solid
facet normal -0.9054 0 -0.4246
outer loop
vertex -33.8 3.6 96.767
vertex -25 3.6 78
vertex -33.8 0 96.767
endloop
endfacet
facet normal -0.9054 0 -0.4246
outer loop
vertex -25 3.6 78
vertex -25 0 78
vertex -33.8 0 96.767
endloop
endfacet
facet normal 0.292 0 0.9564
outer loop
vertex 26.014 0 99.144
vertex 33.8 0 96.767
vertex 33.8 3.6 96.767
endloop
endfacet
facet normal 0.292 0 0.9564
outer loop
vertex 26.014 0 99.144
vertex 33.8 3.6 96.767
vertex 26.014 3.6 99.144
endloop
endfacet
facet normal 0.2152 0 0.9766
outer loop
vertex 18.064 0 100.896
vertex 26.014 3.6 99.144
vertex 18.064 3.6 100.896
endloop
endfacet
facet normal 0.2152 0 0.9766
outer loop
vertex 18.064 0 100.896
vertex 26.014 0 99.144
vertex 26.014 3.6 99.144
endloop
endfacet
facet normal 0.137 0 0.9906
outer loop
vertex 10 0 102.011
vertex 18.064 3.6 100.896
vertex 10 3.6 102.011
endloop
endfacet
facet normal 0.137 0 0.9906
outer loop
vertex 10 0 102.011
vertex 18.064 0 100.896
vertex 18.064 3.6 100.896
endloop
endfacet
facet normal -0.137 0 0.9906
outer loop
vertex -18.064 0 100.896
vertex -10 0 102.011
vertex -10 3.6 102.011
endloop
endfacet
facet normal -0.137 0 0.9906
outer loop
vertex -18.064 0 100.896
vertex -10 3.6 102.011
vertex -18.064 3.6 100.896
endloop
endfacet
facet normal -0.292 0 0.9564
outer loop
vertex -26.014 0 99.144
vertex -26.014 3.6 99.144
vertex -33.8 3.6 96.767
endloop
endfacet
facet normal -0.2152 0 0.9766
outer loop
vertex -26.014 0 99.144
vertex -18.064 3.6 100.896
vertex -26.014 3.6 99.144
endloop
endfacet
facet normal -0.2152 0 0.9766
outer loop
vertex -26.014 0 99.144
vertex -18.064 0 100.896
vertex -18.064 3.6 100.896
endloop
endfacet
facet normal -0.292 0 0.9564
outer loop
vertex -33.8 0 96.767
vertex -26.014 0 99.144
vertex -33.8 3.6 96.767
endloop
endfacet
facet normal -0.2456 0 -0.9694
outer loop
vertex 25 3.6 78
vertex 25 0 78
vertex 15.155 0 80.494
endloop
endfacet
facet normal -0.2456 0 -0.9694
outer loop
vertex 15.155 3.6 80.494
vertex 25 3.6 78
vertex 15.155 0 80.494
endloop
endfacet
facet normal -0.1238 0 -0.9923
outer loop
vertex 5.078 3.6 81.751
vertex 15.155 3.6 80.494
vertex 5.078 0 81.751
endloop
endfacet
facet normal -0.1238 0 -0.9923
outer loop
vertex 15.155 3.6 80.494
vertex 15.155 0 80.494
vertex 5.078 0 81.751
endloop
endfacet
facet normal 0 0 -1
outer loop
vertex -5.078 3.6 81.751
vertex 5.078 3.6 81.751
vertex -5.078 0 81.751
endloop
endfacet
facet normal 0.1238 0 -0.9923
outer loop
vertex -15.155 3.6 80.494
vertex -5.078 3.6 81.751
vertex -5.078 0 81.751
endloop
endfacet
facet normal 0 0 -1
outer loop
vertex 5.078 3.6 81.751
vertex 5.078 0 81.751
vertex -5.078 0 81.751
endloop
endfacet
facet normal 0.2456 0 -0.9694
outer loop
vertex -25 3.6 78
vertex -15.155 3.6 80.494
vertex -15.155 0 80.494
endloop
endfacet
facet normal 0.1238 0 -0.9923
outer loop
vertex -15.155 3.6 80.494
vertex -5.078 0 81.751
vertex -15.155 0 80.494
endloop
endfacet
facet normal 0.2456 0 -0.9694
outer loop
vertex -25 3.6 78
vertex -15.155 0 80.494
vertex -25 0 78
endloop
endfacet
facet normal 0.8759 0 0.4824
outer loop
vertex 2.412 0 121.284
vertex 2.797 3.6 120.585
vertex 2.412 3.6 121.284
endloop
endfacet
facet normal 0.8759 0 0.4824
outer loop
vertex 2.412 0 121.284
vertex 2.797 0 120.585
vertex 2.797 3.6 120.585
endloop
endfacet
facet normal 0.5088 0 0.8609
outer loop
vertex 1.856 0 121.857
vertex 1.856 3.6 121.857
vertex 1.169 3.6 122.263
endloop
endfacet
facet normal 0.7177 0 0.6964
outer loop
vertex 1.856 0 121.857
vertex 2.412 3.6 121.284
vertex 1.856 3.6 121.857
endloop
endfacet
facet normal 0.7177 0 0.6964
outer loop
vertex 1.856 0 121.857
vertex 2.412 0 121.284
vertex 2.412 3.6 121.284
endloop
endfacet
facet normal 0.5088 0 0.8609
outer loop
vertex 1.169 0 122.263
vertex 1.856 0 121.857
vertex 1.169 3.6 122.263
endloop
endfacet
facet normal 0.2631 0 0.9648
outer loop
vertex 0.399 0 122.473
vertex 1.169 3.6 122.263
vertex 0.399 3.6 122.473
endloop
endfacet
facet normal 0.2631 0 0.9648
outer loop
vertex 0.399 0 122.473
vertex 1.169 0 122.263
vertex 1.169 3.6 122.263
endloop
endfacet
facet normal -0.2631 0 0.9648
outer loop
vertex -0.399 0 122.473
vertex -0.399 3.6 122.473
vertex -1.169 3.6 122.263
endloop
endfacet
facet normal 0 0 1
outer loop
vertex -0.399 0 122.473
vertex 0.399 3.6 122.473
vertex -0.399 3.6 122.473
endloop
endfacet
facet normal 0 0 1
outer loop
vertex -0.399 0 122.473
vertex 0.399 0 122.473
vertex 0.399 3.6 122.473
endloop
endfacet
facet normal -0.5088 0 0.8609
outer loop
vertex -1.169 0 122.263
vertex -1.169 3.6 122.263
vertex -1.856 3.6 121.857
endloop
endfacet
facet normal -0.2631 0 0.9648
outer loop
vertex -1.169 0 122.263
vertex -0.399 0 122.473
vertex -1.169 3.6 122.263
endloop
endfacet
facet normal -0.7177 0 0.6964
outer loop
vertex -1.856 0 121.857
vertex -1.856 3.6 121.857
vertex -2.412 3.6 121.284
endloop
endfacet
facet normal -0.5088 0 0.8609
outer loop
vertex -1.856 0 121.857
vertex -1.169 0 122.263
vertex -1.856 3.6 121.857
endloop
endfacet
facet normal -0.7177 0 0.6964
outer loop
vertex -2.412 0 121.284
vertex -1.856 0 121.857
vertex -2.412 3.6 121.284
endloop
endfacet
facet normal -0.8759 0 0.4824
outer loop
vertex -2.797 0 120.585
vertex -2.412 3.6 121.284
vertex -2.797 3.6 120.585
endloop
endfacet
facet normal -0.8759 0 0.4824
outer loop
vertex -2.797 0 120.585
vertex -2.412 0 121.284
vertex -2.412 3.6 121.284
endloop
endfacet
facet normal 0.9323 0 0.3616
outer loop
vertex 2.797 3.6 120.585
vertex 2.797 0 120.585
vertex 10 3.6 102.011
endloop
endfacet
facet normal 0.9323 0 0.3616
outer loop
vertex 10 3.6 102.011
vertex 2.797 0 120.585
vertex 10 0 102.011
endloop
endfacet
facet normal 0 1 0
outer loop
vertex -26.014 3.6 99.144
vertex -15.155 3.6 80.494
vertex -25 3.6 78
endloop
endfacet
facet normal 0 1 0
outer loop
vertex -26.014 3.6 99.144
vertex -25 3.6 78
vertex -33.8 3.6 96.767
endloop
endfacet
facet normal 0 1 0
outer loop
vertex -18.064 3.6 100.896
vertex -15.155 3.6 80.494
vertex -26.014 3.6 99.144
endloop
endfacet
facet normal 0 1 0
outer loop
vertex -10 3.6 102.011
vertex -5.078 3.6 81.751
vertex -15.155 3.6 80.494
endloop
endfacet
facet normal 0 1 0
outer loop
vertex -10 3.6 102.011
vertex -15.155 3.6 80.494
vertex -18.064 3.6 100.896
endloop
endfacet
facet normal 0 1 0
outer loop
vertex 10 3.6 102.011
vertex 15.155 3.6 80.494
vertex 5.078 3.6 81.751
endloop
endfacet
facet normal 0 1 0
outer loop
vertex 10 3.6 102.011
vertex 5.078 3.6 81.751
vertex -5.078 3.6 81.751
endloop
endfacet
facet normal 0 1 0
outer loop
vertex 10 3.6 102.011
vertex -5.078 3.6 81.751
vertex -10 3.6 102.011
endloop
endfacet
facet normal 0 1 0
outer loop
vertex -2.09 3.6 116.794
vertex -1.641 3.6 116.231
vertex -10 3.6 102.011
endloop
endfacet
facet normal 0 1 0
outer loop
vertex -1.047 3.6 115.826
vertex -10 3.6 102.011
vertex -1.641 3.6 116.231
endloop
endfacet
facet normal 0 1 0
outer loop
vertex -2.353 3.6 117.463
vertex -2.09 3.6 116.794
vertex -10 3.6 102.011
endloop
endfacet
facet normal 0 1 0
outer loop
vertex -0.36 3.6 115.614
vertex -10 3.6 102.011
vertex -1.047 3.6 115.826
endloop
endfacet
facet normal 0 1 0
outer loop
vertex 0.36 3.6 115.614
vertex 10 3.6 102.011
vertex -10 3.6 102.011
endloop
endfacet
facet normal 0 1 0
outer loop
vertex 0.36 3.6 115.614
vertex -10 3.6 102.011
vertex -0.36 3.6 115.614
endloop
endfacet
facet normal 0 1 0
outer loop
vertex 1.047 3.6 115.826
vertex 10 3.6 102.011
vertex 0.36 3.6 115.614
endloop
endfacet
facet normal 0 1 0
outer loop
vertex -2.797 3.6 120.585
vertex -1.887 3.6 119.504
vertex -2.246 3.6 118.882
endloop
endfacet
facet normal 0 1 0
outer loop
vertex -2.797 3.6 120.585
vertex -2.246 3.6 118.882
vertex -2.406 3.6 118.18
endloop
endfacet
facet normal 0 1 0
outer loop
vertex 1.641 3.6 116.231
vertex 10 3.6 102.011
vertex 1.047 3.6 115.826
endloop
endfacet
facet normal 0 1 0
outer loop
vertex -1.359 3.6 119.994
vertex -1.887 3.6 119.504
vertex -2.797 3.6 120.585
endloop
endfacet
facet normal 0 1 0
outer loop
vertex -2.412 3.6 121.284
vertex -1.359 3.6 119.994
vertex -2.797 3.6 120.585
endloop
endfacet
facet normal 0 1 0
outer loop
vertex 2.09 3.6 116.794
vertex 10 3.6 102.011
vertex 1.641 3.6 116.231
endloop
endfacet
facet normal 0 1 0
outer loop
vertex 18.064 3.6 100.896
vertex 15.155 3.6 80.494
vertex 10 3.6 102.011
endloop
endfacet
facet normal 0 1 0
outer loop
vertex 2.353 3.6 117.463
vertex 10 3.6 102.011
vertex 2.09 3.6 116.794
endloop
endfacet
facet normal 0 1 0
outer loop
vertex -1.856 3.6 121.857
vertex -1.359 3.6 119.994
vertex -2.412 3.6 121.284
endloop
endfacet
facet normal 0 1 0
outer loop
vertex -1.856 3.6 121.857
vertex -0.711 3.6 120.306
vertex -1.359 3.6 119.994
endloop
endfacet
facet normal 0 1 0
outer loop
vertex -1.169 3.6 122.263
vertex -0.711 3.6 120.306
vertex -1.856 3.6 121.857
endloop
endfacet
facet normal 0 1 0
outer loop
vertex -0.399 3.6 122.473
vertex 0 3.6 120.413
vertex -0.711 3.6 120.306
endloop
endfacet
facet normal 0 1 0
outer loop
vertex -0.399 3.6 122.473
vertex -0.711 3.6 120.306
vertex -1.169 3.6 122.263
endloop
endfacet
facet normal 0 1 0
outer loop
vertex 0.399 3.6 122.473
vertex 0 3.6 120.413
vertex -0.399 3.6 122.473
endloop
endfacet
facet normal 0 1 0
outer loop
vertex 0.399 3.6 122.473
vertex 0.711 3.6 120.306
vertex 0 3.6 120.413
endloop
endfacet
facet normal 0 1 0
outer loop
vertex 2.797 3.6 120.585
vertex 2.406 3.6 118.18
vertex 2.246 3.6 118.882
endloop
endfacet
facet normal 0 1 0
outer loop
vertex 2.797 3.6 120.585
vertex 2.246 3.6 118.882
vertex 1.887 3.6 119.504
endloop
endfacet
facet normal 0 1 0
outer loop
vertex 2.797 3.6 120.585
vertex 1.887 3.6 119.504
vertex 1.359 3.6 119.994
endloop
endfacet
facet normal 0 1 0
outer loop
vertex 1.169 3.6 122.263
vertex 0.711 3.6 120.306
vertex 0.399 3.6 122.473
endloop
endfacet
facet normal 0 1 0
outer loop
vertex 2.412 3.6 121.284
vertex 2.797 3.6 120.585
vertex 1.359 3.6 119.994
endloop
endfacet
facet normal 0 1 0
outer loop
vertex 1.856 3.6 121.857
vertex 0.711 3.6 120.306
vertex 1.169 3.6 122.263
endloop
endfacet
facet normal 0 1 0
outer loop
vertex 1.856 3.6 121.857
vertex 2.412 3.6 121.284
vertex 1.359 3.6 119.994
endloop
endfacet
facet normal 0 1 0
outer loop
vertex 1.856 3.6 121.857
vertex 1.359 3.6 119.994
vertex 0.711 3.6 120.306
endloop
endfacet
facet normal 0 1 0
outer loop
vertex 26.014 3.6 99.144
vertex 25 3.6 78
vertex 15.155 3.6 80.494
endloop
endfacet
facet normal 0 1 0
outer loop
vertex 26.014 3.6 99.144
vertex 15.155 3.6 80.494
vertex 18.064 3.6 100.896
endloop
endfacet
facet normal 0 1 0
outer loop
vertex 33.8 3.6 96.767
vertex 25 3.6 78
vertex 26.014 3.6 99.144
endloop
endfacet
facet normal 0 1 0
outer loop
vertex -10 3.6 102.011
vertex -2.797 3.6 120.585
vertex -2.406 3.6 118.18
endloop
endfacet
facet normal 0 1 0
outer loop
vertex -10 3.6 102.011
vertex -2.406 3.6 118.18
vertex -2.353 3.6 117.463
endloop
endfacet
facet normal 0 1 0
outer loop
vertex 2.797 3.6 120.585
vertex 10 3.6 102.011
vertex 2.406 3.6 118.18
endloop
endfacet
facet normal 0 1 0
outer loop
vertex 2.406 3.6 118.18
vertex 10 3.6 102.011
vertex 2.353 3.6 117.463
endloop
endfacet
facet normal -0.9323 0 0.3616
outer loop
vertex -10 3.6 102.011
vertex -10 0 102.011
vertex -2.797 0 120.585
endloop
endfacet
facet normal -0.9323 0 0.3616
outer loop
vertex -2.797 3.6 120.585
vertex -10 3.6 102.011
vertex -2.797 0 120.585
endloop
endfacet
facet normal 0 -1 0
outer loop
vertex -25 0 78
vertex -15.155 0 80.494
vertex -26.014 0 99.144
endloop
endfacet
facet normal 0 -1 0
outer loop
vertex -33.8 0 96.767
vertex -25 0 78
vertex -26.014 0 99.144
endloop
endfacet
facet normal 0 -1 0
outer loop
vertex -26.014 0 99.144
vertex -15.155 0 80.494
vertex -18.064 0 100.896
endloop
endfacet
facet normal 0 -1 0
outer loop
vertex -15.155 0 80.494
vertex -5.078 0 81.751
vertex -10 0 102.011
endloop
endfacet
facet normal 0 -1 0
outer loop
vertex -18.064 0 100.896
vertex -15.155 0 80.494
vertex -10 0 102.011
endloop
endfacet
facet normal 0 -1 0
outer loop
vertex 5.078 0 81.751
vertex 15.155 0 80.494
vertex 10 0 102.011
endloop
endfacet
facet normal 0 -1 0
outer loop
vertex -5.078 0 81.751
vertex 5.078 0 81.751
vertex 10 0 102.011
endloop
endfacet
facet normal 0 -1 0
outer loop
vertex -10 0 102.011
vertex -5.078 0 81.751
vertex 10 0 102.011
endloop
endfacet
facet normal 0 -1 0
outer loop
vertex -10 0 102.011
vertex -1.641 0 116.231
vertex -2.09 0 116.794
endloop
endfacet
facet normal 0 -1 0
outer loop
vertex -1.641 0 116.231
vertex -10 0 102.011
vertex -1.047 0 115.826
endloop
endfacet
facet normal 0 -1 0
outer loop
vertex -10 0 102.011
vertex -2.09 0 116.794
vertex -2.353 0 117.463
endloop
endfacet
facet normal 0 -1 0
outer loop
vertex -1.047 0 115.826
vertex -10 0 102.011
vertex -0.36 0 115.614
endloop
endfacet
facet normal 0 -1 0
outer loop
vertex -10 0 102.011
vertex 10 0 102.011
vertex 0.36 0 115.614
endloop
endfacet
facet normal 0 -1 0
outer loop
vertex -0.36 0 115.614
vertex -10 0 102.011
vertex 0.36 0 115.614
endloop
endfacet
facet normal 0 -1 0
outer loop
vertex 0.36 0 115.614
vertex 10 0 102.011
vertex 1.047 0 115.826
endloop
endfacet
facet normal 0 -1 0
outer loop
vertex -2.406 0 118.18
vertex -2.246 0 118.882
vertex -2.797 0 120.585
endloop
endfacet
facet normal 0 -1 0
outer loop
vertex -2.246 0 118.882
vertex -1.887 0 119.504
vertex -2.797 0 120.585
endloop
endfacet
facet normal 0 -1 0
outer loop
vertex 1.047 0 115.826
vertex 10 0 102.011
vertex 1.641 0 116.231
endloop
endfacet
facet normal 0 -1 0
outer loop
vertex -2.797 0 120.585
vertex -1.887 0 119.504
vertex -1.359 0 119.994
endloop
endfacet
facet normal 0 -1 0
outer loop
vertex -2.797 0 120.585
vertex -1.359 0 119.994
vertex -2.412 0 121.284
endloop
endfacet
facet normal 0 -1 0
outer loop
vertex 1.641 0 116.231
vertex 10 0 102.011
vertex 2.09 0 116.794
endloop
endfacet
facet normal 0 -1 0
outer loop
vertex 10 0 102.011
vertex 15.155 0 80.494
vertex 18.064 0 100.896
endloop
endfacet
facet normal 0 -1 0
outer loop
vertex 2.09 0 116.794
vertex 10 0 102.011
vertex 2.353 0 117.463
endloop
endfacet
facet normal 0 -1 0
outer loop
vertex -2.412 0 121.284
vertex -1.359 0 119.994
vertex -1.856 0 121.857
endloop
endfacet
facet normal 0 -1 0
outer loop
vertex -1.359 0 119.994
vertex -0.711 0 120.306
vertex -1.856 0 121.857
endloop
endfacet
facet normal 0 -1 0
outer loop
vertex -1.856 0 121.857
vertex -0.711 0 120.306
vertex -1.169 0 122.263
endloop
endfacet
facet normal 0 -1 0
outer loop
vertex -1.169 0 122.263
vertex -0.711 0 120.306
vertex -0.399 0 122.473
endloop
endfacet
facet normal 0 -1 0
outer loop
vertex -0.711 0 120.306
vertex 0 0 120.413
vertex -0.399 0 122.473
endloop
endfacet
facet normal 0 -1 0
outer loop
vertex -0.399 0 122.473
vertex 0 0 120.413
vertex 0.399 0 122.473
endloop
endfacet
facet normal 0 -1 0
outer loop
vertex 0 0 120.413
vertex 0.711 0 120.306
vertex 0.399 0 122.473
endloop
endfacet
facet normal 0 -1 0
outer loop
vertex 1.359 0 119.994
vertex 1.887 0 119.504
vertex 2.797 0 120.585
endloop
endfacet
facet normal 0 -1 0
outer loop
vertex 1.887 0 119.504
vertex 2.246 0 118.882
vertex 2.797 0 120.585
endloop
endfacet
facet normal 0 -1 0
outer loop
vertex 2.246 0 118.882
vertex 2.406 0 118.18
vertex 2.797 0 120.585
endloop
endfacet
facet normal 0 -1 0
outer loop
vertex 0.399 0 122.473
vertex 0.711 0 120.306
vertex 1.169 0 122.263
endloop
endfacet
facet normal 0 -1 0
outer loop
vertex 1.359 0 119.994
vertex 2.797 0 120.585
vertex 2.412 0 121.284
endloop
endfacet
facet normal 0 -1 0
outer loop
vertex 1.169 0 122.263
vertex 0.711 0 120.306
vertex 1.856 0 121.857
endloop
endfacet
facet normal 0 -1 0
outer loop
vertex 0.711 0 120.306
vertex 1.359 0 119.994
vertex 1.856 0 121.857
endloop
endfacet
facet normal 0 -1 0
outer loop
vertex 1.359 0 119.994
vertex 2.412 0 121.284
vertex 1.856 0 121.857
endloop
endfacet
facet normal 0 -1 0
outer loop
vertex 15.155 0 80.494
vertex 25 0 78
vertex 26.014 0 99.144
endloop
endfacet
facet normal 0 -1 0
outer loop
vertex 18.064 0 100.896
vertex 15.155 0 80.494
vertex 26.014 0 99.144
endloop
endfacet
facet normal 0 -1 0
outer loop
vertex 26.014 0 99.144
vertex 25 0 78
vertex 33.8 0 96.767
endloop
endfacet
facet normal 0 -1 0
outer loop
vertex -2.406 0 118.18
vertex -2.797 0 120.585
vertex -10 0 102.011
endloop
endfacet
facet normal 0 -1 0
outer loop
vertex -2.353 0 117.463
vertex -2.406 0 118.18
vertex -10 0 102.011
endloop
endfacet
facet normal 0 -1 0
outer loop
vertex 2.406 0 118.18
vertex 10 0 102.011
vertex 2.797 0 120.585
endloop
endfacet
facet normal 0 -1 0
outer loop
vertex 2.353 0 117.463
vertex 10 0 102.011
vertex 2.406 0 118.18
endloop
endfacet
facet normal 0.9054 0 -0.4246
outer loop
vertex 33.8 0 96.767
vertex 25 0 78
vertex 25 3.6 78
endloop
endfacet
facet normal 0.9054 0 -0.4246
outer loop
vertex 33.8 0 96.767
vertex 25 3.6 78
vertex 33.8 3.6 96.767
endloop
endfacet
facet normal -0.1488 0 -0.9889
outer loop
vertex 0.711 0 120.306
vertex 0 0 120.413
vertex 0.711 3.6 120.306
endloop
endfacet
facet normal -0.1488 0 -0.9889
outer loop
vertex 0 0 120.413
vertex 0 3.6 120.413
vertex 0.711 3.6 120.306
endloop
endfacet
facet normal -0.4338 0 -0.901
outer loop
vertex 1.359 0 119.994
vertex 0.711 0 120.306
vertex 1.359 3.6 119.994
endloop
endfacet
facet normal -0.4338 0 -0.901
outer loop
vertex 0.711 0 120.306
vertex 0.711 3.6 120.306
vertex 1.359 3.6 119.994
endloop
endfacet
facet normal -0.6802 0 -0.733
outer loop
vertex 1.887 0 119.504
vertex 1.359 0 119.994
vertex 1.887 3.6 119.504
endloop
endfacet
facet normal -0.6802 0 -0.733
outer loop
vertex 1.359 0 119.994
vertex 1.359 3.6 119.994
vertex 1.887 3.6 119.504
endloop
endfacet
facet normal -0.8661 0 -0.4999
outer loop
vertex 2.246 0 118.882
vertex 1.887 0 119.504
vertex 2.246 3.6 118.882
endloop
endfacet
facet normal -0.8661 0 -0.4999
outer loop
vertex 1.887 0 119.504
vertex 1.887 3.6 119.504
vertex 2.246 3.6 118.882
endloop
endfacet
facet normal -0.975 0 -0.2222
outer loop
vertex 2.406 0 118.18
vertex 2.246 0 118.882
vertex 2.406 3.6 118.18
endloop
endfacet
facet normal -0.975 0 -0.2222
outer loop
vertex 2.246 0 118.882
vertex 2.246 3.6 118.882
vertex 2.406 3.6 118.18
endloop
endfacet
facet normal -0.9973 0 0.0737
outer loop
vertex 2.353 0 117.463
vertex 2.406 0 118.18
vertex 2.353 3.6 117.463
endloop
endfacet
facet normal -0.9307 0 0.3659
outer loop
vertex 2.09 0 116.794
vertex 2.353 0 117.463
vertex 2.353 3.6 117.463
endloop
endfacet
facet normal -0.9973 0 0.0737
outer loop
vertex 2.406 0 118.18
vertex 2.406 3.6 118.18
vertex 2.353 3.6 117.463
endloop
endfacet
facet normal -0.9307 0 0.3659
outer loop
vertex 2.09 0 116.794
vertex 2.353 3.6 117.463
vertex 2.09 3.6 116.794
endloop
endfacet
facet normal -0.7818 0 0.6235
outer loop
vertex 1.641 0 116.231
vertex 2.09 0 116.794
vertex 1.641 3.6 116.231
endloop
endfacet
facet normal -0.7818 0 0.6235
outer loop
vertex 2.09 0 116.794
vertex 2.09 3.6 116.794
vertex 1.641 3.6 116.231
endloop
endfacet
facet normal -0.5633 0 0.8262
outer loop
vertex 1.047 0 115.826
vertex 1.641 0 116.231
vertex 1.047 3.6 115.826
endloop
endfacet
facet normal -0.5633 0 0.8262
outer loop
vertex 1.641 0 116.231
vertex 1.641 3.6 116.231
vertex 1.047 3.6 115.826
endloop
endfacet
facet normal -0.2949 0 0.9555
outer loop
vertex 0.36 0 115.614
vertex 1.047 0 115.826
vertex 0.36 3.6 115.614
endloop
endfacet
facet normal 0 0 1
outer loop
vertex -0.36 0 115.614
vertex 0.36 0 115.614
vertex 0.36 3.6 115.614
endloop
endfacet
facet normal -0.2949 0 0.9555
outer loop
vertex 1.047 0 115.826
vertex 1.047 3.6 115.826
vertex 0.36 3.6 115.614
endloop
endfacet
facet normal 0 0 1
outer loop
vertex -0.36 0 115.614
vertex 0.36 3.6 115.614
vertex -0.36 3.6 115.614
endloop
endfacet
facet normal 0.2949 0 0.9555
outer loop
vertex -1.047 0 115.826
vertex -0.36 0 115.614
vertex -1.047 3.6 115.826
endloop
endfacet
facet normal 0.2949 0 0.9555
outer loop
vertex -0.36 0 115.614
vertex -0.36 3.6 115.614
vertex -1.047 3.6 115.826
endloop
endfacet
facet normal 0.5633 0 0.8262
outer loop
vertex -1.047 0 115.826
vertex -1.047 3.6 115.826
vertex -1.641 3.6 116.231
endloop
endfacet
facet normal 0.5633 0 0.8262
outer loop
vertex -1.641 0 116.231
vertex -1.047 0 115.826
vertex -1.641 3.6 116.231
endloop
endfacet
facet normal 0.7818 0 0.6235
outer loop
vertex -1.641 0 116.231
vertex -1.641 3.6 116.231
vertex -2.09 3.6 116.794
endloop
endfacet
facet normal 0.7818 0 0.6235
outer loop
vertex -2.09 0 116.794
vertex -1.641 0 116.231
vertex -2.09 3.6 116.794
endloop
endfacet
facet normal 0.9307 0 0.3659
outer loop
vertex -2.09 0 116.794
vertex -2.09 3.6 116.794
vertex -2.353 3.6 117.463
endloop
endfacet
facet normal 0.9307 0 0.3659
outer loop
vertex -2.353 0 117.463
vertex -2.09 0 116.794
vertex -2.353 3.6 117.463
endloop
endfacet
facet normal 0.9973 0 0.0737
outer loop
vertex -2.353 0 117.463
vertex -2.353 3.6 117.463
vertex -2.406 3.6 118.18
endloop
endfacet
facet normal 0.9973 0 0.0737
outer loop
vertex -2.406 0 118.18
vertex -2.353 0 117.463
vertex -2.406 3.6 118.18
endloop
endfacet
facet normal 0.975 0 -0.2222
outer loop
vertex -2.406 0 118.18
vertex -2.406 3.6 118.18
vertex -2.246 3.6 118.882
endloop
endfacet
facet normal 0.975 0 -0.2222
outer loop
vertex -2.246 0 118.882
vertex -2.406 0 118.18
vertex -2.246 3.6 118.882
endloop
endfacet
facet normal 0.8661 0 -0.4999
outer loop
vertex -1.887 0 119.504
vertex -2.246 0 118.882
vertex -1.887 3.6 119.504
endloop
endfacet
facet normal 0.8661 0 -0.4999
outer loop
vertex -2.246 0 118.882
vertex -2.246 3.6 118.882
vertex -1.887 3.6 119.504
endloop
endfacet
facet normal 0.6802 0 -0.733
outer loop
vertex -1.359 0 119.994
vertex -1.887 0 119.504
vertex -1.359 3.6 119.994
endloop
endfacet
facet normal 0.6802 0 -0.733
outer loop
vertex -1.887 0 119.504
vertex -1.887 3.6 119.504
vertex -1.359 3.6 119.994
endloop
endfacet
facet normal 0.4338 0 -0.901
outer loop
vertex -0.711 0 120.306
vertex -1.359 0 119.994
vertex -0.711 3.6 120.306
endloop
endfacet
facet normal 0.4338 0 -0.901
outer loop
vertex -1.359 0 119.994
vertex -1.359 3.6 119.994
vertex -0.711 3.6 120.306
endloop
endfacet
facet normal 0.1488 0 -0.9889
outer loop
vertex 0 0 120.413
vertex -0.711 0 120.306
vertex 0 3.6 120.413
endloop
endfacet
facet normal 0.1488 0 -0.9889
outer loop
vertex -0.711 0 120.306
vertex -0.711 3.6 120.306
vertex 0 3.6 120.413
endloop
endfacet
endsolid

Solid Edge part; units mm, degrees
sketch "Sketch1" plane through (10.8674, 0, 10.8674) normal (0, -1, 0) x (1, 0, 0)
  line L0 (-35.8674, 67.1326) -> (-44.6674, 85.8994)
  arc A0 (-44.6674, 85.8994) -> (-20.8674, 91.1436) centre (-10.8674, -10.8674) cw
  line L1 (-20.8674, 91.1436) -> (-13.6644, 109.7173)
  arc A1 (-13.6644, 109.7173) -> (-8.0703, 109.7173) centre (-10.8674, 108.6326) cw
  line L2 (-8.0703, 109.7173) -> (-0.8674, 91.1436)
  line L3 (14.1326, 67.1326) -> (22.9326, 85.8994)
  arc A2 (14.1326, 67.1326) -> (-35.8674, 67.1326) centre (-10.8674, -10.8674) ccw
  arc A3 (-0.8674, 91.1436) -> (22.9326, 85.8994) centre (-10.8674, -10.8674) cw
  dimension "D1" = 67.6
  dimension "D2" = 50
  dimension "D3" = 102.5
  dimension "D4" = 20
  dimension "D5" = 44.5
  dimension "D6" = 24.5
  dimension "D7" = 3
extrude "Protrusion1" add sketch "Sketch1" against normal blind 3.6
hole "Hole_1" at (0, 3.6, 118) direction (0, -1, 0) diameter 4.826 end up to next
properties material "Steel"
